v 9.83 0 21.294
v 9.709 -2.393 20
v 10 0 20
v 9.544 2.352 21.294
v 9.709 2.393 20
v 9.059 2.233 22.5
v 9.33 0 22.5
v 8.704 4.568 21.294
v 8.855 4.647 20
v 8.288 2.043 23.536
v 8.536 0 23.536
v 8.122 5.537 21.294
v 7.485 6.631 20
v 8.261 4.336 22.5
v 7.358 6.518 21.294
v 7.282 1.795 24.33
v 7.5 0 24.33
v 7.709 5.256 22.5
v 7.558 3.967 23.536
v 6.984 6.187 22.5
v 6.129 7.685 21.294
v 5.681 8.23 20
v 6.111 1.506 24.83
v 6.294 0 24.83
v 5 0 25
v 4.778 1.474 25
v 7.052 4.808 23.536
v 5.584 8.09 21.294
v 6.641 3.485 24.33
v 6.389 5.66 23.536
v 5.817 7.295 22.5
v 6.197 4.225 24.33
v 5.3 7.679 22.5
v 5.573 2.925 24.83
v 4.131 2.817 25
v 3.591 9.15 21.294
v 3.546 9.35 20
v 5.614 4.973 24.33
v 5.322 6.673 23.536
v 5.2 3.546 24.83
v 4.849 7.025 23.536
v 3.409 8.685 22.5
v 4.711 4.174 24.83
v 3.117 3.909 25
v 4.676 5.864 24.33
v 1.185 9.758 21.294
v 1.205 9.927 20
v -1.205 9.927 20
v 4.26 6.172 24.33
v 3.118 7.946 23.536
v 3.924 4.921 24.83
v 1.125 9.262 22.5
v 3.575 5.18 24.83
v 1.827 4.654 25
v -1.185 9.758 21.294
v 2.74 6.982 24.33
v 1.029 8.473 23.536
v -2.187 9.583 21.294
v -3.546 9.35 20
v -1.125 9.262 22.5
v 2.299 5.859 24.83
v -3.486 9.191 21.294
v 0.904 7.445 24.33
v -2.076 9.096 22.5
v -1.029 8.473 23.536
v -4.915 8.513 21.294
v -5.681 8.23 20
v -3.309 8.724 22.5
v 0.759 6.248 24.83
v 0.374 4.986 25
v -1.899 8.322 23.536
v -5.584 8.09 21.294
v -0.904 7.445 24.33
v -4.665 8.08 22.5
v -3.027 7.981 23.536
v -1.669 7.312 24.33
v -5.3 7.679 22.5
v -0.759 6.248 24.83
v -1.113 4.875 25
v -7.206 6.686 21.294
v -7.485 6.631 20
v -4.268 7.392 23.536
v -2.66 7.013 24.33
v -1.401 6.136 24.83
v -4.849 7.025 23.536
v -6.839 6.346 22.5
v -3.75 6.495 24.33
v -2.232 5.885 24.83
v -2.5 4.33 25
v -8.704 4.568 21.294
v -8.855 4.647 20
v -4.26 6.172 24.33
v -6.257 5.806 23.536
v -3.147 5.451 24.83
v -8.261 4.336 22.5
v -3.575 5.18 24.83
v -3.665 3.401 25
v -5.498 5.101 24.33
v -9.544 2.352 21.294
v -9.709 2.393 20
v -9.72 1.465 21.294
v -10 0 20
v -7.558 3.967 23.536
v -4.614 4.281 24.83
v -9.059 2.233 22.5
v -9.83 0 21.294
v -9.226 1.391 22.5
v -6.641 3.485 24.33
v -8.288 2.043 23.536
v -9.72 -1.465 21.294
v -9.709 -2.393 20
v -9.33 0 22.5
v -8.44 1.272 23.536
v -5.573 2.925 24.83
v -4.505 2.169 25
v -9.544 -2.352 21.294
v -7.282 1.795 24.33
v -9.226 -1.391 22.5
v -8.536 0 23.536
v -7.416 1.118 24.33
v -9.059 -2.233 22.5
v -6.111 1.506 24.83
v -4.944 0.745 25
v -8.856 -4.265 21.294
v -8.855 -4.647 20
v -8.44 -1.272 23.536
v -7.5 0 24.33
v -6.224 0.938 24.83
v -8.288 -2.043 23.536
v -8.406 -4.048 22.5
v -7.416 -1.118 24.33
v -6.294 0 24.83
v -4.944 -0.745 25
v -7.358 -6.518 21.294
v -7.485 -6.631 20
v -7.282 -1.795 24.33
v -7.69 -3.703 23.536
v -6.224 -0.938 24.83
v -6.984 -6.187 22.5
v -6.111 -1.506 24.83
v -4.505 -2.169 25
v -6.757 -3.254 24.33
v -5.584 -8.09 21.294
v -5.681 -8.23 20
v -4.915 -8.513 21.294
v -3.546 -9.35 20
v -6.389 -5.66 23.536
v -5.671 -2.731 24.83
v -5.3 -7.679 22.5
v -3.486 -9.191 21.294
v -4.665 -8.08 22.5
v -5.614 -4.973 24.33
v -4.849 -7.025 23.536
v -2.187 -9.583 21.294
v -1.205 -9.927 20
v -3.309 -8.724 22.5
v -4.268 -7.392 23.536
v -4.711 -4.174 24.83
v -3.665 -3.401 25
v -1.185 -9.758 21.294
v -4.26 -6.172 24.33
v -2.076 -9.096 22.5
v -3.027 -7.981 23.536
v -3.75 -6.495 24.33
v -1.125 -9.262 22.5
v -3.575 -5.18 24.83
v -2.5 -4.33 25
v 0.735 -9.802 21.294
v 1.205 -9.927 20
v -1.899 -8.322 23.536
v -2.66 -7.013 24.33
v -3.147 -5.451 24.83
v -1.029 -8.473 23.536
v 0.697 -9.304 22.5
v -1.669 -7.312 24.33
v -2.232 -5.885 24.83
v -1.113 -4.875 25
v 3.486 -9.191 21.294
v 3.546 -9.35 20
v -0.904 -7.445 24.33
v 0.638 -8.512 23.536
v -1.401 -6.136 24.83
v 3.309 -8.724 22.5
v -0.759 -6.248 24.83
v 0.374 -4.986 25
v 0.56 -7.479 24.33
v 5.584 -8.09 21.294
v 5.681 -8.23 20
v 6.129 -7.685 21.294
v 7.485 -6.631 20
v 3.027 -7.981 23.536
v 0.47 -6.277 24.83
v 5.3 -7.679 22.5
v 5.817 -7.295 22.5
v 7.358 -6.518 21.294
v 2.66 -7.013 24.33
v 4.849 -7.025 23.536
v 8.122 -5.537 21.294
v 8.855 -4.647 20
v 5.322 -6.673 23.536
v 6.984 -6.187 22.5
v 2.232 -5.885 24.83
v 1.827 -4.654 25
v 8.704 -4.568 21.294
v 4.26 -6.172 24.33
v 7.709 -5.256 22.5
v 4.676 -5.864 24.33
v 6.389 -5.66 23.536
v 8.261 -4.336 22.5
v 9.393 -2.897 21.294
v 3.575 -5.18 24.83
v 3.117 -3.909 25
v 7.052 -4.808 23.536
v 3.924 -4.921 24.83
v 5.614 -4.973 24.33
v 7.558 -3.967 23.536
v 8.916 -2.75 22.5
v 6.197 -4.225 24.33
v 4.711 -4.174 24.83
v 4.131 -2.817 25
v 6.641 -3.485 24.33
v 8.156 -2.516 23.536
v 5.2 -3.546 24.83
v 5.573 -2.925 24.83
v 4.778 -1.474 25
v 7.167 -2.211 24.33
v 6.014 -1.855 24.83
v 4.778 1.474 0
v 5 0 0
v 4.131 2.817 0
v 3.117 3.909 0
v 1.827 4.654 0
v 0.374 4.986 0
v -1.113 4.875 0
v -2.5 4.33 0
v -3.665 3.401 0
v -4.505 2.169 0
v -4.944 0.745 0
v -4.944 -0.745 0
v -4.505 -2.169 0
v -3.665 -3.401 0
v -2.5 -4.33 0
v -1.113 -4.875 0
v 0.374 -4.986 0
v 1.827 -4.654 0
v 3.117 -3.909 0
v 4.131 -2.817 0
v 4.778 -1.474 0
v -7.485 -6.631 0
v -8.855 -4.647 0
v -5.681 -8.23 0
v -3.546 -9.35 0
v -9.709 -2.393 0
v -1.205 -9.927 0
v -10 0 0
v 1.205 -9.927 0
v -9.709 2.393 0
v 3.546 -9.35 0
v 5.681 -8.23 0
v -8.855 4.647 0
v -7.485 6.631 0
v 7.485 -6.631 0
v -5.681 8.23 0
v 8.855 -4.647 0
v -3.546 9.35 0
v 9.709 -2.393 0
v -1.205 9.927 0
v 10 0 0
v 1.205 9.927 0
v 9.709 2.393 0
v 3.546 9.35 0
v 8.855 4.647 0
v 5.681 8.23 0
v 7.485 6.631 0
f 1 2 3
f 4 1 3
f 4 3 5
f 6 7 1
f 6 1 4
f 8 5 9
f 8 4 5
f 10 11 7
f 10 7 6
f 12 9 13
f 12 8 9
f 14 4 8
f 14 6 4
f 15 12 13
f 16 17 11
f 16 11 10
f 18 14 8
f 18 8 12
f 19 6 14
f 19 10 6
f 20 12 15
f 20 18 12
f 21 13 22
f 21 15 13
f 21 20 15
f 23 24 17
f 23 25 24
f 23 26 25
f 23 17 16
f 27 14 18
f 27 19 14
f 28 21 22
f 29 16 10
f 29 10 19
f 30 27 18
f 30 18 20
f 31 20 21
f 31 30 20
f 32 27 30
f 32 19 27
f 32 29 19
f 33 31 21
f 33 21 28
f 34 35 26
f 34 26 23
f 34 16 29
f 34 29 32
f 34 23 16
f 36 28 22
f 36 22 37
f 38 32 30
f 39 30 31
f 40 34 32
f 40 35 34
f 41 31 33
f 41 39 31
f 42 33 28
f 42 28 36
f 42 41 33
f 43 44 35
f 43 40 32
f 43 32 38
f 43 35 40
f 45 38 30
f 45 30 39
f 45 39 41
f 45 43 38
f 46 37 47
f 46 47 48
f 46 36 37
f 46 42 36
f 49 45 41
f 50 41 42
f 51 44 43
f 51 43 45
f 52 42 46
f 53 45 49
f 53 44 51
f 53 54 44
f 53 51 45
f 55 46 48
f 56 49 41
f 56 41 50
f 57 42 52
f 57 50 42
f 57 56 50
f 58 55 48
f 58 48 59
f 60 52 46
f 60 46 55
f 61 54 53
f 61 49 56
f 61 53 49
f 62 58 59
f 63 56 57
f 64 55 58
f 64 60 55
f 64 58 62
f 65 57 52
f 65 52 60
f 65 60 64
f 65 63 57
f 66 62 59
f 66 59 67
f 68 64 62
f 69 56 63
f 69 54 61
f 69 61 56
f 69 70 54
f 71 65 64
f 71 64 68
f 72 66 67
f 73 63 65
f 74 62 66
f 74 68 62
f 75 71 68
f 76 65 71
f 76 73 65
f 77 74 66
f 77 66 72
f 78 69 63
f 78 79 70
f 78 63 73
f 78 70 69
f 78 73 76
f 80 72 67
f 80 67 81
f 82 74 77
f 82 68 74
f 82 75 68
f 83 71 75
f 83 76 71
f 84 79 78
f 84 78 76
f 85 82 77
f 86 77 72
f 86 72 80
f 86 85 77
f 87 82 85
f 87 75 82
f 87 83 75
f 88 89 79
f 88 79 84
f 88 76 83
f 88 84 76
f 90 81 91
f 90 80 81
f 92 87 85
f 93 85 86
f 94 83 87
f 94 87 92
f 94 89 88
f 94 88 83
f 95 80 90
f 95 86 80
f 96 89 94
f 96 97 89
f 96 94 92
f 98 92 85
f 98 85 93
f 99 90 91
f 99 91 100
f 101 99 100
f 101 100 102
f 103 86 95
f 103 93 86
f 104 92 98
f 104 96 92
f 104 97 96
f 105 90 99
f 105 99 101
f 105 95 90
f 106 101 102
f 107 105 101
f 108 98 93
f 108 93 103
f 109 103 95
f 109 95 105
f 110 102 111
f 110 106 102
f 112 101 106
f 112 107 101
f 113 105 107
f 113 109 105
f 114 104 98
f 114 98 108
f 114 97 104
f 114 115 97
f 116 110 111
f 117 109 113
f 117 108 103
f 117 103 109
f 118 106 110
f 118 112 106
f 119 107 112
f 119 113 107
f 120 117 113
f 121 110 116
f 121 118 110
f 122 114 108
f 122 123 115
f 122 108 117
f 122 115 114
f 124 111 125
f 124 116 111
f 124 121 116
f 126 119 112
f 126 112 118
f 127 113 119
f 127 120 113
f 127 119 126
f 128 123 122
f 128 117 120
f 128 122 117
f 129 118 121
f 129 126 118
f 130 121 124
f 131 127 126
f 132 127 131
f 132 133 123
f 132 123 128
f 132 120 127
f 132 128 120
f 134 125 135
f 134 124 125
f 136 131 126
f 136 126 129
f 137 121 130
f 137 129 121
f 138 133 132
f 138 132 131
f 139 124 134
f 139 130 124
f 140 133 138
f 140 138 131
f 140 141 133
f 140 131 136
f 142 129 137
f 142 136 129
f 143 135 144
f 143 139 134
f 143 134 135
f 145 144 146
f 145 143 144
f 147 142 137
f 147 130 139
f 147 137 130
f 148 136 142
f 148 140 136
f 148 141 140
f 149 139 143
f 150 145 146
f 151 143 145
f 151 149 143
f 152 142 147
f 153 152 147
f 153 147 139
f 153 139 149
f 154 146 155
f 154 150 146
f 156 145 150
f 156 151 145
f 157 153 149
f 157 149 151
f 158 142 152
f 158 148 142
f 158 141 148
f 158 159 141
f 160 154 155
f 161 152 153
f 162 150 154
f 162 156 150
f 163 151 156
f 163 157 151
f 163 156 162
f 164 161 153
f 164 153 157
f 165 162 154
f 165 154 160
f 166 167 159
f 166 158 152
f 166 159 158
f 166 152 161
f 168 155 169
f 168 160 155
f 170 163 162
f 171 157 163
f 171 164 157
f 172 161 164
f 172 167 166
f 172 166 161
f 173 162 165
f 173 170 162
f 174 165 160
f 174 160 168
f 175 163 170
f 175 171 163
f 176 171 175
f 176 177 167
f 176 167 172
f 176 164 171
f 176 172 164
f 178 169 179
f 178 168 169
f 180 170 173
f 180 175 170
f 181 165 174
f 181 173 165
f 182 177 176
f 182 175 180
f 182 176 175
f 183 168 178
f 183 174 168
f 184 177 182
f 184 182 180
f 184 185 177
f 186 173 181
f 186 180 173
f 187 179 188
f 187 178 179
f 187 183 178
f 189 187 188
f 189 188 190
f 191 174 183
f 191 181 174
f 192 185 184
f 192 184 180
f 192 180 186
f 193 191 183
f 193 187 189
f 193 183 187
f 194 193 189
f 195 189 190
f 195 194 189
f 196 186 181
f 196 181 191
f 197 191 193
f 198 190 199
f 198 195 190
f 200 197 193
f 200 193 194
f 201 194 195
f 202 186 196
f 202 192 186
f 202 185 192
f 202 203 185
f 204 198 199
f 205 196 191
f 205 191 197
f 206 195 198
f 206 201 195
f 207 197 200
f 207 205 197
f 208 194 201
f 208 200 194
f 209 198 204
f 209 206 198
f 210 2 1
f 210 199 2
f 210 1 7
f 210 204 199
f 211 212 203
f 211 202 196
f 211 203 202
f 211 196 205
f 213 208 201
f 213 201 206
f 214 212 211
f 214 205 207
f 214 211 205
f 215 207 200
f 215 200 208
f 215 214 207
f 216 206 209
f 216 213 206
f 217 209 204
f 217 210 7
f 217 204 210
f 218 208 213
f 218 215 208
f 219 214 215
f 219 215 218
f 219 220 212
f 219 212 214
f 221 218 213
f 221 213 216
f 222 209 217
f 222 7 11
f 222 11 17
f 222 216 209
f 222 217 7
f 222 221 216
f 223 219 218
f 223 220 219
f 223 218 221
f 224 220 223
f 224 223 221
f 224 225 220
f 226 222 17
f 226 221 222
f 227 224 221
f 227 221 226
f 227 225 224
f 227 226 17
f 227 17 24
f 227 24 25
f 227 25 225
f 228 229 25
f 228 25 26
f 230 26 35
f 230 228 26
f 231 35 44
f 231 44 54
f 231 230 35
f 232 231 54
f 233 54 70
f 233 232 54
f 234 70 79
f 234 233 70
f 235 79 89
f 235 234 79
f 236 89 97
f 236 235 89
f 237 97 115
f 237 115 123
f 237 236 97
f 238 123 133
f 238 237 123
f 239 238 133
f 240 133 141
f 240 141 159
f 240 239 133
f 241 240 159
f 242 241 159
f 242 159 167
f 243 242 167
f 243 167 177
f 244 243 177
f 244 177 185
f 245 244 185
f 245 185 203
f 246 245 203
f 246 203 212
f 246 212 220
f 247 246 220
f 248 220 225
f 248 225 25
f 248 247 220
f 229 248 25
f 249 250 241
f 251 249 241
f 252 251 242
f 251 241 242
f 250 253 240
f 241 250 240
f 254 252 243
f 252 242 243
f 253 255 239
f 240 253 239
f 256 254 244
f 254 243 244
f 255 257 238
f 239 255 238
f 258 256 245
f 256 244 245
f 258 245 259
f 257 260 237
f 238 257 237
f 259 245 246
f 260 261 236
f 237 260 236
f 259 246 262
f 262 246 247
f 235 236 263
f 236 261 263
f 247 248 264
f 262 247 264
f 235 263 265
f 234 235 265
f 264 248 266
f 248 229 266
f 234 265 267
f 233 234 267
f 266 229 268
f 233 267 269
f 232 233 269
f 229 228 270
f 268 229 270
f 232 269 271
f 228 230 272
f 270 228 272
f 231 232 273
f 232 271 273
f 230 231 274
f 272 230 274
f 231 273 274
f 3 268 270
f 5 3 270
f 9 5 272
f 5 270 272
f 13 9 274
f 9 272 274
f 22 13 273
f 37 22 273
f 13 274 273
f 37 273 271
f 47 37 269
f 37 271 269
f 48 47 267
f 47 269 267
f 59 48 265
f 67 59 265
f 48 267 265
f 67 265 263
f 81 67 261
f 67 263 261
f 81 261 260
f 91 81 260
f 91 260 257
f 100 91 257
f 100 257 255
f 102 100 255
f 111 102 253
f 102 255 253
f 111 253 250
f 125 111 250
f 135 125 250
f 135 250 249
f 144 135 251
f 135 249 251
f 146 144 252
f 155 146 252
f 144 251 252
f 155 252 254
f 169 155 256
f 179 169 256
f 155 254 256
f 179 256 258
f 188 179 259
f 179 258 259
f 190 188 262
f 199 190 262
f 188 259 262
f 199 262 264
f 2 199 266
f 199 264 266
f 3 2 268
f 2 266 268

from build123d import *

# Parameters (mm, degrees)
F0_R     = 10
F0_R_2   = 5
F1_DEPTH = 25
F2_DEPTH = 25
F3_R     = 4.99999


# Not quite as in the source:
# - a fillet or chamfer is up to 0.001 mm smaller than in the source, because OpenCascade refuses the exact size


with BuildPart() as f1:
    # F0 (on Top) → F1 (new body)
    with BuildSketch(Plane.XY):
        Circle(F0_R)
        Circle(F0_R_2, mode=Mode.SUBTRACT)
    extrude(amount=F1_DEPTH)

    # F0 (on Top) → F2 (join)
    with BuildSketch(Plane.XY):
        Circle(F0_R)
        Circle(F0_R_2, mode=Mode.SUBTRACT)
    extrude(amount=F2_DEPTH)

    # F3 (radius 5 in the source; OpenCascade refuses exactly that, so slightly less here)
    f3_edges = [f1.edges().sort_by_distance(p)[0] for p in [
        (-10, 0, 25),
    ]]
    fillet(f3_edges, radius=F3_R)


solid = f1.part
